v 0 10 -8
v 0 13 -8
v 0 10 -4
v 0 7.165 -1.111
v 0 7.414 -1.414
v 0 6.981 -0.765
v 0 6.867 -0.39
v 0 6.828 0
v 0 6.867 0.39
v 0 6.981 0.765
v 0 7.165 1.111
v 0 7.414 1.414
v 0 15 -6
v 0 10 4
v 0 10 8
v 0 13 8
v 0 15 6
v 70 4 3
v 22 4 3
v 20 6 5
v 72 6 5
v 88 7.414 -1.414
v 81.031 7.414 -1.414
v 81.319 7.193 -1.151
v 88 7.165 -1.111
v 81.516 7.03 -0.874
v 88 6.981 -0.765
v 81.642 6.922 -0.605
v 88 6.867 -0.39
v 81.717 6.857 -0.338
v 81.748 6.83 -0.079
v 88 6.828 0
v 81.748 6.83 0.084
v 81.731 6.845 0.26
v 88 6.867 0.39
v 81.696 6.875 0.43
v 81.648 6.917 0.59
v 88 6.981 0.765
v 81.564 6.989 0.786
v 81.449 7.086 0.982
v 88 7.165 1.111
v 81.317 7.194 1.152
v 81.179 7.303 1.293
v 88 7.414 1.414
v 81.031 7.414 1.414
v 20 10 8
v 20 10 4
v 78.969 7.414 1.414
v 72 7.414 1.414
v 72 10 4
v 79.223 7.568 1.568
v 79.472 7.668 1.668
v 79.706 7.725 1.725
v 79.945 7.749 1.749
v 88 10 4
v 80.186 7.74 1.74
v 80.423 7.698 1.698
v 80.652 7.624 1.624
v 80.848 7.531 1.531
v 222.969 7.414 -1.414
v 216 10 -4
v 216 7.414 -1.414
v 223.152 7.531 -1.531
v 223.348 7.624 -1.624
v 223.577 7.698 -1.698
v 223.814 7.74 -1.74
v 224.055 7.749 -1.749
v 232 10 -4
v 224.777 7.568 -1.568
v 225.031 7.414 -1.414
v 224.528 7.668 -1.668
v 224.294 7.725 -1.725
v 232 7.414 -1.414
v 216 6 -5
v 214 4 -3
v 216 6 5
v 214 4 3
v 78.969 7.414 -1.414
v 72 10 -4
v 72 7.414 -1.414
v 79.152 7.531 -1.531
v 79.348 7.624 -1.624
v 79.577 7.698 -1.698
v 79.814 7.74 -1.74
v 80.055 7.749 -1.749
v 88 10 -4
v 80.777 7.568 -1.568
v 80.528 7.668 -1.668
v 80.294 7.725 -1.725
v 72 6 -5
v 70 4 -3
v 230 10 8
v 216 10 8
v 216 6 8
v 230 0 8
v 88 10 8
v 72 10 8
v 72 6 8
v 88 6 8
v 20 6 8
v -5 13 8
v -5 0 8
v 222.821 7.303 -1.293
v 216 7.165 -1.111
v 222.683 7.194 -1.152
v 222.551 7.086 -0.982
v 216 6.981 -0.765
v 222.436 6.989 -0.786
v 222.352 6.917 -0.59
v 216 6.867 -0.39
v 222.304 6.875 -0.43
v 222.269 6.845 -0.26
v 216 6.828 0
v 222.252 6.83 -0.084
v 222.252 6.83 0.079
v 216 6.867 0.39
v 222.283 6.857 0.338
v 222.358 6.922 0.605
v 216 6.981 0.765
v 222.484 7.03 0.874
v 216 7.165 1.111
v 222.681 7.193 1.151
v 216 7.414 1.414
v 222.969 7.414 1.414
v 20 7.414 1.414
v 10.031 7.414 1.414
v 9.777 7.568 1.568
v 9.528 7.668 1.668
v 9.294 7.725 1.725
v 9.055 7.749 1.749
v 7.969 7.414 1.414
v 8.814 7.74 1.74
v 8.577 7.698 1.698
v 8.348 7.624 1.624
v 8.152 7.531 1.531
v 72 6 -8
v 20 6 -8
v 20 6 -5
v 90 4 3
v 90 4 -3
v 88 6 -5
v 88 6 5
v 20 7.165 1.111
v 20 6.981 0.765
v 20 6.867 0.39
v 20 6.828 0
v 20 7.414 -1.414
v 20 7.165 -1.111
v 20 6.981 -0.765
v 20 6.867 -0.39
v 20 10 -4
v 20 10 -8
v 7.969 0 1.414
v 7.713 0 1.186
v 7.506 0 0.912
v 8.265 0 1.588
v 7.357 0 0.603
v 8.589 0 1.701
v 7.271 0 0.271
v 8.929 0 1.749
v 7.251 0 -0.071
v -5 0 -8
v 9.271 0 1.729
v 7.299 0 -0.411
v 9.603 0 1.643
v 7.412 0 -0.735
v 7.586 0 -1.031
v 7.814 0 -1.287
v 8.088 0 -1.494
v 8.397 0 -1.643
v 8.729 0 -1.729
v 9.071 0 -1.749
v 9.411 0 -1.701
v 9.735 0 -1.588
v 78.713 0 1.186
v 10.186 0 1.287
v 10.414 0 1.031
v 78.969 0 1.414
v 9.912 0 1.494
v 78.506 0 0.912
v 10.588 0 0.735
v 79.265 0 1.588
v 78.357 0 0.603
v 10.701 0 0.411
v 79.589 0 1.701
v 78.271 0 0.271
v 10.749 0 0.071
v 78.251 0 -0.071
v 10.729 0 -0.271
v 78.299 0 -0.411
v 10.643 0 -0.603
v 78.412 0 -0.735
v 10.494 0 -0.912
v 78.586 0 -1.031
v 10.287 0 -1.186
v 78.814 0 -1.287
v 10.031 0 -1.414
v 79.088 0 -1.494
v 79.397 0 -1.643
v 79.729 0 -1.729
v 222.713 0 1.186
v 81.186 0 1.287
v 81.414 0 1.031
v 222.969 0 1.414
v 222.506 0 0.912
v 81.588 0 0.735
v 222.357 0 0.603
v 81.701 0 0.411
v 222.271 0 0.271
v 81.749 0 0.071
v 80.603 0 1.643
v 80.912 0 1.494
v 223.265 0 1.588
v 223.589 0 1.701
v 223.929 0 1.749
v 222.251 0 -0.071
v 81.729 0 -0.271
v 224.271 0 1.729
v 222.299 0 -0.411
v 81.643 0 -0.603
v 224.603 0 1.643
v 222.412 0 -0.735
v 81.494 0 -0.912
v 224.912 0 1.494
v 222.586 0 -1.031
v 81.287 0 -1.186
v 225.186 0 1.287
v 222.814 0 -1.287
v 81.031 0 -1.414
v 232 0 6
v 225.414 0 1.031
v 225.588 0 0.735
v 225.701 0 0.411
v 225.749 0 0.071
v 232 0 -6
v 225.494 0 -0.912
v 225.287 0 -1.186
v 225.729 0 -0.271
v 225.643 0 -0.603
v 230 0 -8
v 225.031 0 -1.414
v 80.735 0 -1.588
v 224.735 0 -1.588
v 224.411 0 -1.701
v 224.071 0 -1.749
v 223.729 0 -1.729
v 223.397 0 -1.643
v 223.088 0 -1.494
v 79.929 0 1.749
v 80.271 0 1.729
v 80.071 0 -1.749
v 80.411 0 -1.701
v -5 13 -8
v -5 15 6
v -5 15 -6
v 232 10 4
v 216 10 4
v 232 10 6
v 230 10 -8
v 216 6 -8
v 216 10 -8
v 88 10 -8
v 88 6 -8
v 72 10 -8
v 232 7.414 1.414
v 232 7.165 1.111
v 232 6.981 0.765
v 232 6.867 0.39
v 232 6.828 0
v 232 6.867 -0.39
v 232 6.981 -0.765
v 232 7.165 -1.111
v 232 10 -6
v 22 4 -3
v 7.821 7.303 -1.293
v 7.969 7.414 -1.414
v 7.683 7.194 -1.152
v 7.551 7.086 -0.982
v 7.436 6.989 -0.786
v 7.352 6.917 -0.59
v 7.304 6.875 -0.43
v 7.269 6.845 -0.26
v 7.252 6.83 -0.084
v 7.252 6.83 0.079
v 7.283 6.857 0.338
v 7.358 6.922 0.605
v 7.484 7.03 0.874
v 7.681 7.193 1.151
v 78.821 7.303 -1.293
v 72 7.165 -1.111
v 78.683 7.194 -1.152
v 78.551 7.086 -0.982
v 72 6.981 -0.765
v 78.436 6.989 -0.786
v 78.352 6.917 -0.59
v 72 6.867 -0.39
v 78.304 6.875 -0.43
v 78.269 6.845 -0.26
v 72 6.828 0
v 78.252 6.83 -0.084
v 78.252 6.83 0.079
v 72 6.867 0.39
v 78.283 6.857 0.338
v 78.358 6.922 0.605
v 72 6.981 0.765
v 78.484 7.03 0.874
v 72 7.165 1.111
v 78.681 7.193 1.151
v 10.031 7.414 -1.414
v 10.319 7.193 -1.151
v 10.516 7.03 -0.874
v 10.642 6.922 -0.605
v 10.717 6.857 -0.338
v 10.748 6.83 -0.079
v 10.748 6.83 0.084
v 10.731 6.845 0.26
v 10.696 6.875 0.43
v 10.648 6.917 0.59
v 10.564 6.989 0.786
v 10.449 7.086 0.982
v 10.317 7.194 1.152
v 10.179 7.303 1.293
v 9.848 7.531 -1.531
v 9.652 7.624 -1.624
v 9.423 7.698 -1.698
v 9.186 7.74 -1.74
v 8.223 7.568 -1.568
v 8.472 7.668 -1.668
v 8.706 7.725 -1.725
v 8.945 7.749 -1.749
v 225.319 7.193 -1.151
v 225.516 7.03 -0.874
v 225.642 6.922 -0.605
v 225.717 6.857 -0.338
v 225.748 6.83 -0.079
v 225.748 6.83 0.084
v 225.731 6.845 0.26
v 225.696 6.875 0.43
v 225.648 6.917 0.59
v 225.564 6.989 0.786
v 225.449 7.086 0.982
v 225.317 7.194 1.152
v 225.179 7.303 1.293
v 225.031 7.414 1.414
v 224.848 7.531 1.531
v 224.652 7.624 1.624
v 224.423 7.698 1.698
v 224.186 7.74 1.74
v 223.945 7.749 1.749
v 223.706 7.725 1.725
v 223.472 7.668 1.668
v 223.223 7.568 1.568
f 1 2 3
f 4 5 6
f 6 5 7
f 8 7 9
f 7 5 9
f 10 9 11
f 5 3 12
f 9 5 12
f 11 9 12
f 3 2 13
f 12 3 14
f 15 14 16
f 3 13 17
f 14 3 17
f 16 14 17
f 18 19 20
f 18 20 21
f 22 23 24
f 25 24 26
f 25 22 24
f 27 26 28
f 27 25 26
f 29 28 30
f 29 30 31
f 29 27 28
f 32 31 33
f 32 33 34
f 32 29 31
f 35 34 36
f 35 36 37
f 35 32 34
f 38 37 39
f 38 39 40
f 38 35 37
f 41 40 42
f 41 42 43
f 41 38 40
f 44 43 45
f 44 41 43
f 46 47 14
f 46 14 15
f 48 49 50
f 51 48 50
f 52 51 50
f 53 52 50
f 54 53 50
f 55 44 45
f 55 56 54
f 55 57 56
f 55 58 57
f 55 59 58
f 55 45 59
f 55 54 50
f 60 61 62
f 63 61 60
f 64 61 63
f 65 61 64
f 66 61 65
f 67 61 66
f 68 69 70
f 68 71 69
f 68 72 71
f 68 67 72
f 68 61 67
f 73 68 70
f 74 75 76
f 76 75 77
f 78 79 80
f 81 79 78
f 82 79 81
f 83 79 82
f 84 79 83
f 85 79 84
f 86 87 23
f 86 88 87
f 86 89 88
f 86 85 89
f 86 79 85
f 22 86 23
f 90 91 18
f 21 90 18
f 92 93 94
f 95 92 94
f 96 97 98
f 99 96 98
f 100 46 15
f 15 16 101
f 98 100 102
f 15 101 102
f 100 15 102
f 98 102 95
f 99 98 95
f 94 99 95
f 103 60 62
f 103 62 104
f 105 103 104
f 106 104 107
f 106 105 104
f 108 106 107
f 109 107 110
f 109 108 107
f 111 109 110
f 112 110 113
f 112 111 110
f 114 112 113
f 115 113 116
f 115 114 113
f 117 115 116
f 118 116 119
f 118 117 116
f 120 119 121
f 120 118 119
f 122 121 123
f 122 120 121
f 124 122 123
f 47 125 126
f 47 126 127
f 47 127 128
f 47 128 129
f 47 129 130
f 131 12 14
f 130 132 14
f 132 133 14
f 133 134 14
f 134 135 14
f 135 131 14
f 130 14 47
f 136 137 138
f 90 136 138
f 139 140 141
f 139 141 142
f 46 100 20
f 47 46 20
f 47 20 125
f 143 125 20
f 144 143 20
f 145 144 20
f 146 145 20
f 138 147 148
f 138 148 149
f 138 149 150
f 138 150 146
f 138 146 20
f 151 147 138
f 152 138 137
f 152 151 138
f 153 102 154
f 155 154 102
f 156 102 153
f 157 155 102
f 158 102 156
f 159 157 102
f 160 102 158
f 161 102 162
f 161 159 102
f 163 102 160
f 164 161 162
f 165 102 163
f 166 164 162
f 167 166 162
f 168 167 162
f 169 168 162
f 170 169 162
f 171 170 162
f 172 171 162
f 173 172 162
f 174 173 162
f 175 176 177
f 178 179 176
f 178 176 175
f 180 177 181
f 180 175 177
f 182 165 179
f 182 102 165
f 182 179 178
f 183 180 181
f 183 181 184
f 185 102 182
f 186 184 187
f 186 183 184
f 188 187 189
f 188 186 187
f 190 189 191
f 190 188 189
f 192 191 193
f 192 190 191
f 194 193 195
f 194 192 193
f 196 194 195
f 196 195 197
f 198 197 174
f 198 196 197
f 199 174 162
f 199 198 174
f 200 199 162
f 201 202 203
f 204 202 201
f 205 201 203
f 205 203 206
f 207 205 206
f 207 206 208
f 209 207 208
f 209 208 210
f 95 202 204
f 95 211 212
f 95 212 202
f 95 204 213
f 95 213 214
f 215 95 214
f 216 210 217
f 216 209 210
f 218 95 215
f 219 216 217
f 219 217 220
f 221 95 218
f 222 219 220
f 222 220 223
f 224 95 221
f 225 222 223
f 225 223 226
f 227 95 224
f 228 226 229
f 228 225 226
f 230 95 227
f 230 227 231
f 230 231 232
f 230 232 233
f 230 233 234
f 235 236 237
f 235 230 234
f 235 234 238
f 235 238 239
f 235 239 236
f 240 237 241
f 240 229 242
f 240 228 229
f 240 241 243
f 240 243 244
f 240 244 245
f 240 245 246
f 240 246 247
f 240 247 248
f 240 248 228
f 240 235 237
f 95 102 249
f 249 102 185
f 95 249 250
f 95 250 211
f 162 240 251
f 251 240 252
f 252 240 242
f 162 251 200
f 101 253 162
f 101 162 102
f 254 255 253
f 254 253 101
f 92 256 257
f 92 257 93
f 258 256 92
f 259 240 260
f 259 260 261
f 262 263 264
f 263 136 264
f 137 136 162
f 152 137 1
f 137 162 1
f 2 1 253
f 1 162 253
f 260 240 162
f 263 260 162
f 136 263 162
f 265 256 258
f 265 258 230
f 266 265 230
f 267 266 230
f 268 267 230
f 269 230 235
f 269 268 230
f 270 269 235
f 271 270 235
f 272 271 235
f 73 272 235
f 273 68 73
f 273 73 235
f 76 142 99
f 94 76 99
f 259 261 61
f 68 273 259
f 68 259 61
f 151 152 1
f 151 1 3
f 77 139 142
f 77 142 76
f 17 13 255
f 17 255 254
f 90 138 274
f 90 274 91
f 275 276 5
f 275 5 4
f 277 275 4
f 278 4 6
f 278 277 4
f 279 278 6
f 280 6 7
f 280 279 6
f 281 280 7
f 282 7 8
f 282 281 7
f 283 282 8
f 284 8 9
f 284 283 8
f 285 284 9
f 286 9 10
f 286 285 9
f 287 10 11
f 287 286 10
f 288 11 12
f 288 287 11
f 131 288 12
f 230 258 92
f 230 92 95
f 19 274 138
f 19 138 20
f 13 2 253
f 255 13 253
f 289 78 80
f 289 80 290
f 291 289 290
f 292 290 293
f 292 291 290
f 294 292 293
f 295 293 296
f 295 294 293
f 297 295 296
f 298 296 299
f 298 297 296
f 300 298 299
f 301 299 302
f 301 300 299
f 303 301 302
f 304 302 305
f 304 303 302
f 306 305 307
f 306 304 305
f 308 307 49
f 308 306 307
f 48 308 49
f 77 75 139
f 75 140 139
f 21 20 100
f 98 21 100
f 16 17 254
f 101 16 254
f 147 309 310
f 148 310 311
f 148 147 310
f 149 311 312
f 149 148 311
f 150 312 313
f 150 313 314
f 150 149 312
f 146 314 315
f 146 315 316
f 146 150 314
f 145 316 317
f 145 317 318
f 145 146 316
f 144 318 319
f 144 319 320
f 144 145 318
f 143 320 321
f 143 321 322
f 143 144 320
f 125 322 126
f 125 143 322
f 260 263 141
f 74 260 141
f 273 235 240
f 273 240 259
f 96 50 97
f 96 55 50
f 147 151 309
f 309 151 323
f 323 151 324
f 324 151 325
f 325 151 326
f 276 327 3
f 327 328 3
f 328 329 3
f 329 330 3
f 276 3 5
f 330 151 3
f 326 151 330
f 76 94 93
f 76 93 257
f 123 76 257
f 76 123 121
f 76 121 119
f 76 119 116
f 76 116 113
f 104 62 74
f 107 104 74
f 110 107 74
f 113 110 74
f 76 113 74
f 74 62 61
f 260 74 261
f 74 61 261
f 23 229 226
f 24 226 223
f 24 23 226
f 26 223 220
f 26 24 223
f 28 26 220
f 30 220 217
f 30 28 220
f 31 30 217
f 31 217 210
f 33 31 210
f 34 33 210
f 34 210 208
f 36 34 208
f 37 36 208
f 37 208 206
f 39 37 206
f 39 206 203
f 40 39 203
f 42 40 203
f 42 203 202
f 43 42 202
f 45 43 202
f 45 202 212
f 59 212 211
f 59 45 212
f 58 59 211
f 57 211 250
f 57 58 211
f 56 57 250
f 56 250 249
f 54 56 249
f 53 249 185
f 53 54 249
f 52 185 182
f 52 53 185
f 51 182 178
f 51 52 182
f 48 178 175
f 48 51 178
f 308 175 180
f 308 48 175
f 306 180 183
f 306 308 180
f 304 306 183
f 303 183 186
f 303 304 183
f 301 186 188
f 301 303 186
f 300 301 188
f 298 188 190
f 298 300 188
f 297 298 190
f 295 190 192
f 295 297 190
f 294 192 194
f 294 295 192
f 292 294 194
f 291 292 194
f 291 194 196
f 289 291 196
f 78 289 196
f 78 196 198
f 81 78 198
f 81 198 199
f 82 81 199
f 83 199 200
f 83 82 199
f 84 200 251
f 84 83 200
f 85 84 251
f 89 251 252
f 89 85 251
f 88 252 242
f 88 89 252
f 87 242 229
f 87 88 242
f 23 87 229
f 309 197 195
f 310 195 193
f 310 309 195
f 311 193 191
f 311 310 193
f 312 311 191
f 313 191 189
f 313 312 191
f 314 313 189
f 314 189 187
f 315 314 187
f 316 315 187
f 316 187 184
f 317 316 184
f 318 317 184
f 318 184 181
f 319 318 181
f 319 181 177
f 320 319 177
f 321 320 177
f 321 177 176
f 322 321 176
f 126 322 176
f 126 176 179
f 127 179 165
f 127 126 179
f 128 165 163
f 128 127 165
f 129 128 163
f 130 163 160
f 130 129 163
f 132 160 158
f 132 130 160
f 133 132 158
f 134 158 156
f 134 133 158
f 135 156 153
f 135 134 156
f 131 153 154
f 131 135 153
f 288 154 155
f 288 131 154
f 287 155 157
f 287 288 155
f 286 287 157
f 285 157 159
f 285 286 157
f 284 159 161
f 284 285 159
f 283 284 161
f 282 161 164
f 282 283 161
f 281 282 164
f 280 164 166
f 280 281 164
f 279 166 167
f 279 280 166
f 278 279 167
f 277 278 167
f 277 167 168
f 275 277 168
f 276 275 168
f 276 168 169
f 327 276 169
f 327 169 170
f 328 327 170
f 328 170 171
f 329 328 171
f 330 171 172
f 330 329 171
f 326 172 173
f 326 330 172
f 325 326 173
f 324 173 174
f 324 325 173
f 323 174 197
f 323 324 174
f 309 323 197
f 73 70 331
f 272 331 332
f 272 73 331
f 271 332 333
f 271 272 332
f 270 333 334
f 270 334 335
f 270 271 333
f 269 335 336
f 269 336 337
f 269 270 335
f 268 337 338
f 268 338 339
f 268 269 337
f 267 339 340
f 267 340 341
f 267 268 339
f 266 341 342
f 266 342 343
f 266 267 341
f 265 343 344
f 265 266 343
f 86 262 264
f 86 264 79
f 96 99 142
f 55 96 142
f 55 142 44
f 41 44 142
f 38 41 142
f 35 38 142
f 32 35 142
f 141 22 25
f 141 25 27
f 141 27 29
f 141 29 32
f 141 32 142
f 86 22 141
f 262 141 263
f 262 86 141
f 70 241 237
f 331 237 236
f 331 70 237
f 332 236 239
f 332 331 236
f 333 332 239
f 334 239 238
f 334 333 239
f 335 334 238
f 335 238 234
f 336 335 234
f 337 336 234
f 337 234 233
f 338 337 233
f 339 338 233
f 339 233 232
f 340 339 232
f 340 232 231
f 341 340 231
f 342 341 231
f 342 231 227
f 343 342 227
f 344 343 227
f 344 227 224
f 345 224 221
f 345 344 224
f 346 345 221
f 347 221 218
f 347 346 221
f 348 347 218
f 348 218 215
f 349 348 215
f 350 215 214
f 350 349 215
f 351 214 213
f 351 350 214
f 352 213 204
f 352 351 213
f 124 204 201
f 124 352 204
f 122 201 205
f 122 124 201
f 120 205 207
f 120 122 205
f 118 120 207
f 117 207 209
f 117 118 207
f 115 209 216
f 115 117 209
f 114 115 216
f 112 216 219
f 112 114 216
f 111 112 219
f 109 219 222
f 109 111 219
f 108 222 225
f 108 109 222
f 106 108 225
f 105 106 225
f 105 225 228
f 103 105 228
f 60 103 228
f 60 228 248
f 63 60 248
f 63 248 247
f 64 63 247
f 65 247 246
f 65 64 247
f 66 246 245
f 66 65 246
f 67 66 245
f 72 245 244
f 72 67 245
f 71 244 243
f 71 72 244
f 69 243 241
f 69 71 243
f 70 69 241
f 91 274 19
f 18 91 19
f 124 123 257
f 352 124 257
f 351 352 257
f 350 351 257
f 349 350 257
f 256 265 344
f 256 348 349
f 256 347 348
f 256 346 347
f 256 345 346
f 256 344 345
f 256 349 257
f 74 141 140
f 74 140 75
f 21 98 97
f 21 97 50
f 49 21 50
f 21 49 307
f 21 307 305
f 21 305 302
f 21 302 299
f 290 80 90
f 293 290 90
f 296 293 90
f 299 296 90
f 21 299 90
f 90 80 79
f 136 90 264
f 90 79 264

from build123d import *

# Parameters (mm, degrees)
EXTRUDE_1_DEPTH          = 20
SKETCH_2_W               = 16
SKETCH_2_H               = 15
EXTRUDE_2_DEPTH          = 5
EXTRUDE_3_DEPTH          = 210
EXTRUDE_4_DEPTH          = 8
PATTERN_LINEAR_1_COUNT   = 2
PATTERN_LINEAR_1_PITCH   = 144
FILLET_1_R               = 2
CHAMFER_1_SIZE           = 2
CUT_EXTRUDE_1_DEPTH      = 233.622010996
CUT_EXTRUDE_1_DEPTH_BACK = 233.622010996
SKETCH_5_R               = 1.75


with BuildPart() as part:
    # Эскиз1 → Бобышка-Вытянуть1 (new body)
    with BuildSketch(Plane(origin=(0, 0, 0), x_dir=(0, 0, -1), z_dir=(1, 0, 0))):
        Polygon((-8, 0), (8, 0), (8, 10), (4, 10), (0, 6), (-4, 10), (-8, 10), align=None)
    extrude(amount=EXTRUDE_1_DEPTH)

    # Эскиз2 → Бобышка-Вытянуть2 (add)
    with BuildSketch(Plane.ZY):
        with Locations((0, 7.5)):
            Rectangle(SKETCH_2_W, SKETCH_2_H)
    extrude(amount=EXTRUDE_2_DEPTH)

    # Эскиз3 → Бобышка-Вытянуть3 (add)
    with BuildSketch(Plane(origin=(20, 0, 0), x_dir=(0, 0, -1), z_dir=(1, 0, 0))):
        Polygon((-8, 0), (8, 0), (8, 4), (8, 6), (5, 6), (5, 4), (-5, 4), (-5, 6), (-8, 6), (-8, 4), align=None)
    extrude(amount=EXTRUDE_3_DEPTH)

    # Эскиз4 → Бобышка-Вытянуть4 (add, symmetric)
    with BuildSketch(Plane(origin=(80, 0, 0), x_dir=(0, 0, -1), z_dir=(1, 0, 0))):
        Polygon((-8, 0), (8, 0), (8, 10), (4, 10), (0, 6), (-4, 10), (-8, 10), align=None)
    extrude_4 = extrude(amount=EXTRUDE_4_DEPTH, both=True)

    # Линейный массив1: Бобышка-Вытянуть4 ×2
    with Locations(*[(i * PATTERN_LINEAR_1_PITCH, 0, 0) for i in range(1, PATTERN_LINEAR_1_COUNT)]):
        add(extrude_4)

    # Скругление1
    fillet_1_edges = [part.edges().sort_by_distance(p)[0] for p in [
        (224, 6, 0),
        (10, 6, 0),
        (80, 6, 0),
    ]]
    fillet(fillet_1_edges, radius=FILLET_1_R)

    # Фаска1
    chamfer_1_edges = [part.edges().sort_by_distance(p)[0] for p in [
        (232, 5, -8),
        (232, 5, 8),
        (216, 4, 0),
        (152, 4, -5),
        (88, 4, 0),
        (152, 4, 5),
        (20, 4, 0),
        (46, 4, 5),
        (72, 4, 0),
        (46, 4, -5),
        (-2.5, 15, -8),
        (-2.5, 15, 8),
    ]]
    chamfer(chamfer_1_edges, length=CHAMFER_1_SIZE - 0.0001)  # a hair under: the kernel refuses the full size

    # Эскиз5 → Вырез-Вытянуть1 (cut, two sides: drawn at the far end of the back side and taken through both)
    with BuildSketch(Plane.XZ.offset(-CUT_EXTRUDE_1_DEPTH_BACK)):
        with Locations(Location((9, 0, 0), (0, 0, 306.087147066))):
            Circle(SKETCH_5_R)
        with Locations(Location((80, 0, 0), (0, 0, 306.087147066))):
            Circle(SKETCH_5_R)
        with Locations(Location((224, 0, 0), (0, 0, 306.087147066))):
            Circle(SKETCH_5_R)
    extrude(amount=CUT_EXTRUDE_1_DEPTH + CUT_EXTRUDE_1_DEPTH_BACK, mode=Mode.SUBTRACT)


solid = part.part
